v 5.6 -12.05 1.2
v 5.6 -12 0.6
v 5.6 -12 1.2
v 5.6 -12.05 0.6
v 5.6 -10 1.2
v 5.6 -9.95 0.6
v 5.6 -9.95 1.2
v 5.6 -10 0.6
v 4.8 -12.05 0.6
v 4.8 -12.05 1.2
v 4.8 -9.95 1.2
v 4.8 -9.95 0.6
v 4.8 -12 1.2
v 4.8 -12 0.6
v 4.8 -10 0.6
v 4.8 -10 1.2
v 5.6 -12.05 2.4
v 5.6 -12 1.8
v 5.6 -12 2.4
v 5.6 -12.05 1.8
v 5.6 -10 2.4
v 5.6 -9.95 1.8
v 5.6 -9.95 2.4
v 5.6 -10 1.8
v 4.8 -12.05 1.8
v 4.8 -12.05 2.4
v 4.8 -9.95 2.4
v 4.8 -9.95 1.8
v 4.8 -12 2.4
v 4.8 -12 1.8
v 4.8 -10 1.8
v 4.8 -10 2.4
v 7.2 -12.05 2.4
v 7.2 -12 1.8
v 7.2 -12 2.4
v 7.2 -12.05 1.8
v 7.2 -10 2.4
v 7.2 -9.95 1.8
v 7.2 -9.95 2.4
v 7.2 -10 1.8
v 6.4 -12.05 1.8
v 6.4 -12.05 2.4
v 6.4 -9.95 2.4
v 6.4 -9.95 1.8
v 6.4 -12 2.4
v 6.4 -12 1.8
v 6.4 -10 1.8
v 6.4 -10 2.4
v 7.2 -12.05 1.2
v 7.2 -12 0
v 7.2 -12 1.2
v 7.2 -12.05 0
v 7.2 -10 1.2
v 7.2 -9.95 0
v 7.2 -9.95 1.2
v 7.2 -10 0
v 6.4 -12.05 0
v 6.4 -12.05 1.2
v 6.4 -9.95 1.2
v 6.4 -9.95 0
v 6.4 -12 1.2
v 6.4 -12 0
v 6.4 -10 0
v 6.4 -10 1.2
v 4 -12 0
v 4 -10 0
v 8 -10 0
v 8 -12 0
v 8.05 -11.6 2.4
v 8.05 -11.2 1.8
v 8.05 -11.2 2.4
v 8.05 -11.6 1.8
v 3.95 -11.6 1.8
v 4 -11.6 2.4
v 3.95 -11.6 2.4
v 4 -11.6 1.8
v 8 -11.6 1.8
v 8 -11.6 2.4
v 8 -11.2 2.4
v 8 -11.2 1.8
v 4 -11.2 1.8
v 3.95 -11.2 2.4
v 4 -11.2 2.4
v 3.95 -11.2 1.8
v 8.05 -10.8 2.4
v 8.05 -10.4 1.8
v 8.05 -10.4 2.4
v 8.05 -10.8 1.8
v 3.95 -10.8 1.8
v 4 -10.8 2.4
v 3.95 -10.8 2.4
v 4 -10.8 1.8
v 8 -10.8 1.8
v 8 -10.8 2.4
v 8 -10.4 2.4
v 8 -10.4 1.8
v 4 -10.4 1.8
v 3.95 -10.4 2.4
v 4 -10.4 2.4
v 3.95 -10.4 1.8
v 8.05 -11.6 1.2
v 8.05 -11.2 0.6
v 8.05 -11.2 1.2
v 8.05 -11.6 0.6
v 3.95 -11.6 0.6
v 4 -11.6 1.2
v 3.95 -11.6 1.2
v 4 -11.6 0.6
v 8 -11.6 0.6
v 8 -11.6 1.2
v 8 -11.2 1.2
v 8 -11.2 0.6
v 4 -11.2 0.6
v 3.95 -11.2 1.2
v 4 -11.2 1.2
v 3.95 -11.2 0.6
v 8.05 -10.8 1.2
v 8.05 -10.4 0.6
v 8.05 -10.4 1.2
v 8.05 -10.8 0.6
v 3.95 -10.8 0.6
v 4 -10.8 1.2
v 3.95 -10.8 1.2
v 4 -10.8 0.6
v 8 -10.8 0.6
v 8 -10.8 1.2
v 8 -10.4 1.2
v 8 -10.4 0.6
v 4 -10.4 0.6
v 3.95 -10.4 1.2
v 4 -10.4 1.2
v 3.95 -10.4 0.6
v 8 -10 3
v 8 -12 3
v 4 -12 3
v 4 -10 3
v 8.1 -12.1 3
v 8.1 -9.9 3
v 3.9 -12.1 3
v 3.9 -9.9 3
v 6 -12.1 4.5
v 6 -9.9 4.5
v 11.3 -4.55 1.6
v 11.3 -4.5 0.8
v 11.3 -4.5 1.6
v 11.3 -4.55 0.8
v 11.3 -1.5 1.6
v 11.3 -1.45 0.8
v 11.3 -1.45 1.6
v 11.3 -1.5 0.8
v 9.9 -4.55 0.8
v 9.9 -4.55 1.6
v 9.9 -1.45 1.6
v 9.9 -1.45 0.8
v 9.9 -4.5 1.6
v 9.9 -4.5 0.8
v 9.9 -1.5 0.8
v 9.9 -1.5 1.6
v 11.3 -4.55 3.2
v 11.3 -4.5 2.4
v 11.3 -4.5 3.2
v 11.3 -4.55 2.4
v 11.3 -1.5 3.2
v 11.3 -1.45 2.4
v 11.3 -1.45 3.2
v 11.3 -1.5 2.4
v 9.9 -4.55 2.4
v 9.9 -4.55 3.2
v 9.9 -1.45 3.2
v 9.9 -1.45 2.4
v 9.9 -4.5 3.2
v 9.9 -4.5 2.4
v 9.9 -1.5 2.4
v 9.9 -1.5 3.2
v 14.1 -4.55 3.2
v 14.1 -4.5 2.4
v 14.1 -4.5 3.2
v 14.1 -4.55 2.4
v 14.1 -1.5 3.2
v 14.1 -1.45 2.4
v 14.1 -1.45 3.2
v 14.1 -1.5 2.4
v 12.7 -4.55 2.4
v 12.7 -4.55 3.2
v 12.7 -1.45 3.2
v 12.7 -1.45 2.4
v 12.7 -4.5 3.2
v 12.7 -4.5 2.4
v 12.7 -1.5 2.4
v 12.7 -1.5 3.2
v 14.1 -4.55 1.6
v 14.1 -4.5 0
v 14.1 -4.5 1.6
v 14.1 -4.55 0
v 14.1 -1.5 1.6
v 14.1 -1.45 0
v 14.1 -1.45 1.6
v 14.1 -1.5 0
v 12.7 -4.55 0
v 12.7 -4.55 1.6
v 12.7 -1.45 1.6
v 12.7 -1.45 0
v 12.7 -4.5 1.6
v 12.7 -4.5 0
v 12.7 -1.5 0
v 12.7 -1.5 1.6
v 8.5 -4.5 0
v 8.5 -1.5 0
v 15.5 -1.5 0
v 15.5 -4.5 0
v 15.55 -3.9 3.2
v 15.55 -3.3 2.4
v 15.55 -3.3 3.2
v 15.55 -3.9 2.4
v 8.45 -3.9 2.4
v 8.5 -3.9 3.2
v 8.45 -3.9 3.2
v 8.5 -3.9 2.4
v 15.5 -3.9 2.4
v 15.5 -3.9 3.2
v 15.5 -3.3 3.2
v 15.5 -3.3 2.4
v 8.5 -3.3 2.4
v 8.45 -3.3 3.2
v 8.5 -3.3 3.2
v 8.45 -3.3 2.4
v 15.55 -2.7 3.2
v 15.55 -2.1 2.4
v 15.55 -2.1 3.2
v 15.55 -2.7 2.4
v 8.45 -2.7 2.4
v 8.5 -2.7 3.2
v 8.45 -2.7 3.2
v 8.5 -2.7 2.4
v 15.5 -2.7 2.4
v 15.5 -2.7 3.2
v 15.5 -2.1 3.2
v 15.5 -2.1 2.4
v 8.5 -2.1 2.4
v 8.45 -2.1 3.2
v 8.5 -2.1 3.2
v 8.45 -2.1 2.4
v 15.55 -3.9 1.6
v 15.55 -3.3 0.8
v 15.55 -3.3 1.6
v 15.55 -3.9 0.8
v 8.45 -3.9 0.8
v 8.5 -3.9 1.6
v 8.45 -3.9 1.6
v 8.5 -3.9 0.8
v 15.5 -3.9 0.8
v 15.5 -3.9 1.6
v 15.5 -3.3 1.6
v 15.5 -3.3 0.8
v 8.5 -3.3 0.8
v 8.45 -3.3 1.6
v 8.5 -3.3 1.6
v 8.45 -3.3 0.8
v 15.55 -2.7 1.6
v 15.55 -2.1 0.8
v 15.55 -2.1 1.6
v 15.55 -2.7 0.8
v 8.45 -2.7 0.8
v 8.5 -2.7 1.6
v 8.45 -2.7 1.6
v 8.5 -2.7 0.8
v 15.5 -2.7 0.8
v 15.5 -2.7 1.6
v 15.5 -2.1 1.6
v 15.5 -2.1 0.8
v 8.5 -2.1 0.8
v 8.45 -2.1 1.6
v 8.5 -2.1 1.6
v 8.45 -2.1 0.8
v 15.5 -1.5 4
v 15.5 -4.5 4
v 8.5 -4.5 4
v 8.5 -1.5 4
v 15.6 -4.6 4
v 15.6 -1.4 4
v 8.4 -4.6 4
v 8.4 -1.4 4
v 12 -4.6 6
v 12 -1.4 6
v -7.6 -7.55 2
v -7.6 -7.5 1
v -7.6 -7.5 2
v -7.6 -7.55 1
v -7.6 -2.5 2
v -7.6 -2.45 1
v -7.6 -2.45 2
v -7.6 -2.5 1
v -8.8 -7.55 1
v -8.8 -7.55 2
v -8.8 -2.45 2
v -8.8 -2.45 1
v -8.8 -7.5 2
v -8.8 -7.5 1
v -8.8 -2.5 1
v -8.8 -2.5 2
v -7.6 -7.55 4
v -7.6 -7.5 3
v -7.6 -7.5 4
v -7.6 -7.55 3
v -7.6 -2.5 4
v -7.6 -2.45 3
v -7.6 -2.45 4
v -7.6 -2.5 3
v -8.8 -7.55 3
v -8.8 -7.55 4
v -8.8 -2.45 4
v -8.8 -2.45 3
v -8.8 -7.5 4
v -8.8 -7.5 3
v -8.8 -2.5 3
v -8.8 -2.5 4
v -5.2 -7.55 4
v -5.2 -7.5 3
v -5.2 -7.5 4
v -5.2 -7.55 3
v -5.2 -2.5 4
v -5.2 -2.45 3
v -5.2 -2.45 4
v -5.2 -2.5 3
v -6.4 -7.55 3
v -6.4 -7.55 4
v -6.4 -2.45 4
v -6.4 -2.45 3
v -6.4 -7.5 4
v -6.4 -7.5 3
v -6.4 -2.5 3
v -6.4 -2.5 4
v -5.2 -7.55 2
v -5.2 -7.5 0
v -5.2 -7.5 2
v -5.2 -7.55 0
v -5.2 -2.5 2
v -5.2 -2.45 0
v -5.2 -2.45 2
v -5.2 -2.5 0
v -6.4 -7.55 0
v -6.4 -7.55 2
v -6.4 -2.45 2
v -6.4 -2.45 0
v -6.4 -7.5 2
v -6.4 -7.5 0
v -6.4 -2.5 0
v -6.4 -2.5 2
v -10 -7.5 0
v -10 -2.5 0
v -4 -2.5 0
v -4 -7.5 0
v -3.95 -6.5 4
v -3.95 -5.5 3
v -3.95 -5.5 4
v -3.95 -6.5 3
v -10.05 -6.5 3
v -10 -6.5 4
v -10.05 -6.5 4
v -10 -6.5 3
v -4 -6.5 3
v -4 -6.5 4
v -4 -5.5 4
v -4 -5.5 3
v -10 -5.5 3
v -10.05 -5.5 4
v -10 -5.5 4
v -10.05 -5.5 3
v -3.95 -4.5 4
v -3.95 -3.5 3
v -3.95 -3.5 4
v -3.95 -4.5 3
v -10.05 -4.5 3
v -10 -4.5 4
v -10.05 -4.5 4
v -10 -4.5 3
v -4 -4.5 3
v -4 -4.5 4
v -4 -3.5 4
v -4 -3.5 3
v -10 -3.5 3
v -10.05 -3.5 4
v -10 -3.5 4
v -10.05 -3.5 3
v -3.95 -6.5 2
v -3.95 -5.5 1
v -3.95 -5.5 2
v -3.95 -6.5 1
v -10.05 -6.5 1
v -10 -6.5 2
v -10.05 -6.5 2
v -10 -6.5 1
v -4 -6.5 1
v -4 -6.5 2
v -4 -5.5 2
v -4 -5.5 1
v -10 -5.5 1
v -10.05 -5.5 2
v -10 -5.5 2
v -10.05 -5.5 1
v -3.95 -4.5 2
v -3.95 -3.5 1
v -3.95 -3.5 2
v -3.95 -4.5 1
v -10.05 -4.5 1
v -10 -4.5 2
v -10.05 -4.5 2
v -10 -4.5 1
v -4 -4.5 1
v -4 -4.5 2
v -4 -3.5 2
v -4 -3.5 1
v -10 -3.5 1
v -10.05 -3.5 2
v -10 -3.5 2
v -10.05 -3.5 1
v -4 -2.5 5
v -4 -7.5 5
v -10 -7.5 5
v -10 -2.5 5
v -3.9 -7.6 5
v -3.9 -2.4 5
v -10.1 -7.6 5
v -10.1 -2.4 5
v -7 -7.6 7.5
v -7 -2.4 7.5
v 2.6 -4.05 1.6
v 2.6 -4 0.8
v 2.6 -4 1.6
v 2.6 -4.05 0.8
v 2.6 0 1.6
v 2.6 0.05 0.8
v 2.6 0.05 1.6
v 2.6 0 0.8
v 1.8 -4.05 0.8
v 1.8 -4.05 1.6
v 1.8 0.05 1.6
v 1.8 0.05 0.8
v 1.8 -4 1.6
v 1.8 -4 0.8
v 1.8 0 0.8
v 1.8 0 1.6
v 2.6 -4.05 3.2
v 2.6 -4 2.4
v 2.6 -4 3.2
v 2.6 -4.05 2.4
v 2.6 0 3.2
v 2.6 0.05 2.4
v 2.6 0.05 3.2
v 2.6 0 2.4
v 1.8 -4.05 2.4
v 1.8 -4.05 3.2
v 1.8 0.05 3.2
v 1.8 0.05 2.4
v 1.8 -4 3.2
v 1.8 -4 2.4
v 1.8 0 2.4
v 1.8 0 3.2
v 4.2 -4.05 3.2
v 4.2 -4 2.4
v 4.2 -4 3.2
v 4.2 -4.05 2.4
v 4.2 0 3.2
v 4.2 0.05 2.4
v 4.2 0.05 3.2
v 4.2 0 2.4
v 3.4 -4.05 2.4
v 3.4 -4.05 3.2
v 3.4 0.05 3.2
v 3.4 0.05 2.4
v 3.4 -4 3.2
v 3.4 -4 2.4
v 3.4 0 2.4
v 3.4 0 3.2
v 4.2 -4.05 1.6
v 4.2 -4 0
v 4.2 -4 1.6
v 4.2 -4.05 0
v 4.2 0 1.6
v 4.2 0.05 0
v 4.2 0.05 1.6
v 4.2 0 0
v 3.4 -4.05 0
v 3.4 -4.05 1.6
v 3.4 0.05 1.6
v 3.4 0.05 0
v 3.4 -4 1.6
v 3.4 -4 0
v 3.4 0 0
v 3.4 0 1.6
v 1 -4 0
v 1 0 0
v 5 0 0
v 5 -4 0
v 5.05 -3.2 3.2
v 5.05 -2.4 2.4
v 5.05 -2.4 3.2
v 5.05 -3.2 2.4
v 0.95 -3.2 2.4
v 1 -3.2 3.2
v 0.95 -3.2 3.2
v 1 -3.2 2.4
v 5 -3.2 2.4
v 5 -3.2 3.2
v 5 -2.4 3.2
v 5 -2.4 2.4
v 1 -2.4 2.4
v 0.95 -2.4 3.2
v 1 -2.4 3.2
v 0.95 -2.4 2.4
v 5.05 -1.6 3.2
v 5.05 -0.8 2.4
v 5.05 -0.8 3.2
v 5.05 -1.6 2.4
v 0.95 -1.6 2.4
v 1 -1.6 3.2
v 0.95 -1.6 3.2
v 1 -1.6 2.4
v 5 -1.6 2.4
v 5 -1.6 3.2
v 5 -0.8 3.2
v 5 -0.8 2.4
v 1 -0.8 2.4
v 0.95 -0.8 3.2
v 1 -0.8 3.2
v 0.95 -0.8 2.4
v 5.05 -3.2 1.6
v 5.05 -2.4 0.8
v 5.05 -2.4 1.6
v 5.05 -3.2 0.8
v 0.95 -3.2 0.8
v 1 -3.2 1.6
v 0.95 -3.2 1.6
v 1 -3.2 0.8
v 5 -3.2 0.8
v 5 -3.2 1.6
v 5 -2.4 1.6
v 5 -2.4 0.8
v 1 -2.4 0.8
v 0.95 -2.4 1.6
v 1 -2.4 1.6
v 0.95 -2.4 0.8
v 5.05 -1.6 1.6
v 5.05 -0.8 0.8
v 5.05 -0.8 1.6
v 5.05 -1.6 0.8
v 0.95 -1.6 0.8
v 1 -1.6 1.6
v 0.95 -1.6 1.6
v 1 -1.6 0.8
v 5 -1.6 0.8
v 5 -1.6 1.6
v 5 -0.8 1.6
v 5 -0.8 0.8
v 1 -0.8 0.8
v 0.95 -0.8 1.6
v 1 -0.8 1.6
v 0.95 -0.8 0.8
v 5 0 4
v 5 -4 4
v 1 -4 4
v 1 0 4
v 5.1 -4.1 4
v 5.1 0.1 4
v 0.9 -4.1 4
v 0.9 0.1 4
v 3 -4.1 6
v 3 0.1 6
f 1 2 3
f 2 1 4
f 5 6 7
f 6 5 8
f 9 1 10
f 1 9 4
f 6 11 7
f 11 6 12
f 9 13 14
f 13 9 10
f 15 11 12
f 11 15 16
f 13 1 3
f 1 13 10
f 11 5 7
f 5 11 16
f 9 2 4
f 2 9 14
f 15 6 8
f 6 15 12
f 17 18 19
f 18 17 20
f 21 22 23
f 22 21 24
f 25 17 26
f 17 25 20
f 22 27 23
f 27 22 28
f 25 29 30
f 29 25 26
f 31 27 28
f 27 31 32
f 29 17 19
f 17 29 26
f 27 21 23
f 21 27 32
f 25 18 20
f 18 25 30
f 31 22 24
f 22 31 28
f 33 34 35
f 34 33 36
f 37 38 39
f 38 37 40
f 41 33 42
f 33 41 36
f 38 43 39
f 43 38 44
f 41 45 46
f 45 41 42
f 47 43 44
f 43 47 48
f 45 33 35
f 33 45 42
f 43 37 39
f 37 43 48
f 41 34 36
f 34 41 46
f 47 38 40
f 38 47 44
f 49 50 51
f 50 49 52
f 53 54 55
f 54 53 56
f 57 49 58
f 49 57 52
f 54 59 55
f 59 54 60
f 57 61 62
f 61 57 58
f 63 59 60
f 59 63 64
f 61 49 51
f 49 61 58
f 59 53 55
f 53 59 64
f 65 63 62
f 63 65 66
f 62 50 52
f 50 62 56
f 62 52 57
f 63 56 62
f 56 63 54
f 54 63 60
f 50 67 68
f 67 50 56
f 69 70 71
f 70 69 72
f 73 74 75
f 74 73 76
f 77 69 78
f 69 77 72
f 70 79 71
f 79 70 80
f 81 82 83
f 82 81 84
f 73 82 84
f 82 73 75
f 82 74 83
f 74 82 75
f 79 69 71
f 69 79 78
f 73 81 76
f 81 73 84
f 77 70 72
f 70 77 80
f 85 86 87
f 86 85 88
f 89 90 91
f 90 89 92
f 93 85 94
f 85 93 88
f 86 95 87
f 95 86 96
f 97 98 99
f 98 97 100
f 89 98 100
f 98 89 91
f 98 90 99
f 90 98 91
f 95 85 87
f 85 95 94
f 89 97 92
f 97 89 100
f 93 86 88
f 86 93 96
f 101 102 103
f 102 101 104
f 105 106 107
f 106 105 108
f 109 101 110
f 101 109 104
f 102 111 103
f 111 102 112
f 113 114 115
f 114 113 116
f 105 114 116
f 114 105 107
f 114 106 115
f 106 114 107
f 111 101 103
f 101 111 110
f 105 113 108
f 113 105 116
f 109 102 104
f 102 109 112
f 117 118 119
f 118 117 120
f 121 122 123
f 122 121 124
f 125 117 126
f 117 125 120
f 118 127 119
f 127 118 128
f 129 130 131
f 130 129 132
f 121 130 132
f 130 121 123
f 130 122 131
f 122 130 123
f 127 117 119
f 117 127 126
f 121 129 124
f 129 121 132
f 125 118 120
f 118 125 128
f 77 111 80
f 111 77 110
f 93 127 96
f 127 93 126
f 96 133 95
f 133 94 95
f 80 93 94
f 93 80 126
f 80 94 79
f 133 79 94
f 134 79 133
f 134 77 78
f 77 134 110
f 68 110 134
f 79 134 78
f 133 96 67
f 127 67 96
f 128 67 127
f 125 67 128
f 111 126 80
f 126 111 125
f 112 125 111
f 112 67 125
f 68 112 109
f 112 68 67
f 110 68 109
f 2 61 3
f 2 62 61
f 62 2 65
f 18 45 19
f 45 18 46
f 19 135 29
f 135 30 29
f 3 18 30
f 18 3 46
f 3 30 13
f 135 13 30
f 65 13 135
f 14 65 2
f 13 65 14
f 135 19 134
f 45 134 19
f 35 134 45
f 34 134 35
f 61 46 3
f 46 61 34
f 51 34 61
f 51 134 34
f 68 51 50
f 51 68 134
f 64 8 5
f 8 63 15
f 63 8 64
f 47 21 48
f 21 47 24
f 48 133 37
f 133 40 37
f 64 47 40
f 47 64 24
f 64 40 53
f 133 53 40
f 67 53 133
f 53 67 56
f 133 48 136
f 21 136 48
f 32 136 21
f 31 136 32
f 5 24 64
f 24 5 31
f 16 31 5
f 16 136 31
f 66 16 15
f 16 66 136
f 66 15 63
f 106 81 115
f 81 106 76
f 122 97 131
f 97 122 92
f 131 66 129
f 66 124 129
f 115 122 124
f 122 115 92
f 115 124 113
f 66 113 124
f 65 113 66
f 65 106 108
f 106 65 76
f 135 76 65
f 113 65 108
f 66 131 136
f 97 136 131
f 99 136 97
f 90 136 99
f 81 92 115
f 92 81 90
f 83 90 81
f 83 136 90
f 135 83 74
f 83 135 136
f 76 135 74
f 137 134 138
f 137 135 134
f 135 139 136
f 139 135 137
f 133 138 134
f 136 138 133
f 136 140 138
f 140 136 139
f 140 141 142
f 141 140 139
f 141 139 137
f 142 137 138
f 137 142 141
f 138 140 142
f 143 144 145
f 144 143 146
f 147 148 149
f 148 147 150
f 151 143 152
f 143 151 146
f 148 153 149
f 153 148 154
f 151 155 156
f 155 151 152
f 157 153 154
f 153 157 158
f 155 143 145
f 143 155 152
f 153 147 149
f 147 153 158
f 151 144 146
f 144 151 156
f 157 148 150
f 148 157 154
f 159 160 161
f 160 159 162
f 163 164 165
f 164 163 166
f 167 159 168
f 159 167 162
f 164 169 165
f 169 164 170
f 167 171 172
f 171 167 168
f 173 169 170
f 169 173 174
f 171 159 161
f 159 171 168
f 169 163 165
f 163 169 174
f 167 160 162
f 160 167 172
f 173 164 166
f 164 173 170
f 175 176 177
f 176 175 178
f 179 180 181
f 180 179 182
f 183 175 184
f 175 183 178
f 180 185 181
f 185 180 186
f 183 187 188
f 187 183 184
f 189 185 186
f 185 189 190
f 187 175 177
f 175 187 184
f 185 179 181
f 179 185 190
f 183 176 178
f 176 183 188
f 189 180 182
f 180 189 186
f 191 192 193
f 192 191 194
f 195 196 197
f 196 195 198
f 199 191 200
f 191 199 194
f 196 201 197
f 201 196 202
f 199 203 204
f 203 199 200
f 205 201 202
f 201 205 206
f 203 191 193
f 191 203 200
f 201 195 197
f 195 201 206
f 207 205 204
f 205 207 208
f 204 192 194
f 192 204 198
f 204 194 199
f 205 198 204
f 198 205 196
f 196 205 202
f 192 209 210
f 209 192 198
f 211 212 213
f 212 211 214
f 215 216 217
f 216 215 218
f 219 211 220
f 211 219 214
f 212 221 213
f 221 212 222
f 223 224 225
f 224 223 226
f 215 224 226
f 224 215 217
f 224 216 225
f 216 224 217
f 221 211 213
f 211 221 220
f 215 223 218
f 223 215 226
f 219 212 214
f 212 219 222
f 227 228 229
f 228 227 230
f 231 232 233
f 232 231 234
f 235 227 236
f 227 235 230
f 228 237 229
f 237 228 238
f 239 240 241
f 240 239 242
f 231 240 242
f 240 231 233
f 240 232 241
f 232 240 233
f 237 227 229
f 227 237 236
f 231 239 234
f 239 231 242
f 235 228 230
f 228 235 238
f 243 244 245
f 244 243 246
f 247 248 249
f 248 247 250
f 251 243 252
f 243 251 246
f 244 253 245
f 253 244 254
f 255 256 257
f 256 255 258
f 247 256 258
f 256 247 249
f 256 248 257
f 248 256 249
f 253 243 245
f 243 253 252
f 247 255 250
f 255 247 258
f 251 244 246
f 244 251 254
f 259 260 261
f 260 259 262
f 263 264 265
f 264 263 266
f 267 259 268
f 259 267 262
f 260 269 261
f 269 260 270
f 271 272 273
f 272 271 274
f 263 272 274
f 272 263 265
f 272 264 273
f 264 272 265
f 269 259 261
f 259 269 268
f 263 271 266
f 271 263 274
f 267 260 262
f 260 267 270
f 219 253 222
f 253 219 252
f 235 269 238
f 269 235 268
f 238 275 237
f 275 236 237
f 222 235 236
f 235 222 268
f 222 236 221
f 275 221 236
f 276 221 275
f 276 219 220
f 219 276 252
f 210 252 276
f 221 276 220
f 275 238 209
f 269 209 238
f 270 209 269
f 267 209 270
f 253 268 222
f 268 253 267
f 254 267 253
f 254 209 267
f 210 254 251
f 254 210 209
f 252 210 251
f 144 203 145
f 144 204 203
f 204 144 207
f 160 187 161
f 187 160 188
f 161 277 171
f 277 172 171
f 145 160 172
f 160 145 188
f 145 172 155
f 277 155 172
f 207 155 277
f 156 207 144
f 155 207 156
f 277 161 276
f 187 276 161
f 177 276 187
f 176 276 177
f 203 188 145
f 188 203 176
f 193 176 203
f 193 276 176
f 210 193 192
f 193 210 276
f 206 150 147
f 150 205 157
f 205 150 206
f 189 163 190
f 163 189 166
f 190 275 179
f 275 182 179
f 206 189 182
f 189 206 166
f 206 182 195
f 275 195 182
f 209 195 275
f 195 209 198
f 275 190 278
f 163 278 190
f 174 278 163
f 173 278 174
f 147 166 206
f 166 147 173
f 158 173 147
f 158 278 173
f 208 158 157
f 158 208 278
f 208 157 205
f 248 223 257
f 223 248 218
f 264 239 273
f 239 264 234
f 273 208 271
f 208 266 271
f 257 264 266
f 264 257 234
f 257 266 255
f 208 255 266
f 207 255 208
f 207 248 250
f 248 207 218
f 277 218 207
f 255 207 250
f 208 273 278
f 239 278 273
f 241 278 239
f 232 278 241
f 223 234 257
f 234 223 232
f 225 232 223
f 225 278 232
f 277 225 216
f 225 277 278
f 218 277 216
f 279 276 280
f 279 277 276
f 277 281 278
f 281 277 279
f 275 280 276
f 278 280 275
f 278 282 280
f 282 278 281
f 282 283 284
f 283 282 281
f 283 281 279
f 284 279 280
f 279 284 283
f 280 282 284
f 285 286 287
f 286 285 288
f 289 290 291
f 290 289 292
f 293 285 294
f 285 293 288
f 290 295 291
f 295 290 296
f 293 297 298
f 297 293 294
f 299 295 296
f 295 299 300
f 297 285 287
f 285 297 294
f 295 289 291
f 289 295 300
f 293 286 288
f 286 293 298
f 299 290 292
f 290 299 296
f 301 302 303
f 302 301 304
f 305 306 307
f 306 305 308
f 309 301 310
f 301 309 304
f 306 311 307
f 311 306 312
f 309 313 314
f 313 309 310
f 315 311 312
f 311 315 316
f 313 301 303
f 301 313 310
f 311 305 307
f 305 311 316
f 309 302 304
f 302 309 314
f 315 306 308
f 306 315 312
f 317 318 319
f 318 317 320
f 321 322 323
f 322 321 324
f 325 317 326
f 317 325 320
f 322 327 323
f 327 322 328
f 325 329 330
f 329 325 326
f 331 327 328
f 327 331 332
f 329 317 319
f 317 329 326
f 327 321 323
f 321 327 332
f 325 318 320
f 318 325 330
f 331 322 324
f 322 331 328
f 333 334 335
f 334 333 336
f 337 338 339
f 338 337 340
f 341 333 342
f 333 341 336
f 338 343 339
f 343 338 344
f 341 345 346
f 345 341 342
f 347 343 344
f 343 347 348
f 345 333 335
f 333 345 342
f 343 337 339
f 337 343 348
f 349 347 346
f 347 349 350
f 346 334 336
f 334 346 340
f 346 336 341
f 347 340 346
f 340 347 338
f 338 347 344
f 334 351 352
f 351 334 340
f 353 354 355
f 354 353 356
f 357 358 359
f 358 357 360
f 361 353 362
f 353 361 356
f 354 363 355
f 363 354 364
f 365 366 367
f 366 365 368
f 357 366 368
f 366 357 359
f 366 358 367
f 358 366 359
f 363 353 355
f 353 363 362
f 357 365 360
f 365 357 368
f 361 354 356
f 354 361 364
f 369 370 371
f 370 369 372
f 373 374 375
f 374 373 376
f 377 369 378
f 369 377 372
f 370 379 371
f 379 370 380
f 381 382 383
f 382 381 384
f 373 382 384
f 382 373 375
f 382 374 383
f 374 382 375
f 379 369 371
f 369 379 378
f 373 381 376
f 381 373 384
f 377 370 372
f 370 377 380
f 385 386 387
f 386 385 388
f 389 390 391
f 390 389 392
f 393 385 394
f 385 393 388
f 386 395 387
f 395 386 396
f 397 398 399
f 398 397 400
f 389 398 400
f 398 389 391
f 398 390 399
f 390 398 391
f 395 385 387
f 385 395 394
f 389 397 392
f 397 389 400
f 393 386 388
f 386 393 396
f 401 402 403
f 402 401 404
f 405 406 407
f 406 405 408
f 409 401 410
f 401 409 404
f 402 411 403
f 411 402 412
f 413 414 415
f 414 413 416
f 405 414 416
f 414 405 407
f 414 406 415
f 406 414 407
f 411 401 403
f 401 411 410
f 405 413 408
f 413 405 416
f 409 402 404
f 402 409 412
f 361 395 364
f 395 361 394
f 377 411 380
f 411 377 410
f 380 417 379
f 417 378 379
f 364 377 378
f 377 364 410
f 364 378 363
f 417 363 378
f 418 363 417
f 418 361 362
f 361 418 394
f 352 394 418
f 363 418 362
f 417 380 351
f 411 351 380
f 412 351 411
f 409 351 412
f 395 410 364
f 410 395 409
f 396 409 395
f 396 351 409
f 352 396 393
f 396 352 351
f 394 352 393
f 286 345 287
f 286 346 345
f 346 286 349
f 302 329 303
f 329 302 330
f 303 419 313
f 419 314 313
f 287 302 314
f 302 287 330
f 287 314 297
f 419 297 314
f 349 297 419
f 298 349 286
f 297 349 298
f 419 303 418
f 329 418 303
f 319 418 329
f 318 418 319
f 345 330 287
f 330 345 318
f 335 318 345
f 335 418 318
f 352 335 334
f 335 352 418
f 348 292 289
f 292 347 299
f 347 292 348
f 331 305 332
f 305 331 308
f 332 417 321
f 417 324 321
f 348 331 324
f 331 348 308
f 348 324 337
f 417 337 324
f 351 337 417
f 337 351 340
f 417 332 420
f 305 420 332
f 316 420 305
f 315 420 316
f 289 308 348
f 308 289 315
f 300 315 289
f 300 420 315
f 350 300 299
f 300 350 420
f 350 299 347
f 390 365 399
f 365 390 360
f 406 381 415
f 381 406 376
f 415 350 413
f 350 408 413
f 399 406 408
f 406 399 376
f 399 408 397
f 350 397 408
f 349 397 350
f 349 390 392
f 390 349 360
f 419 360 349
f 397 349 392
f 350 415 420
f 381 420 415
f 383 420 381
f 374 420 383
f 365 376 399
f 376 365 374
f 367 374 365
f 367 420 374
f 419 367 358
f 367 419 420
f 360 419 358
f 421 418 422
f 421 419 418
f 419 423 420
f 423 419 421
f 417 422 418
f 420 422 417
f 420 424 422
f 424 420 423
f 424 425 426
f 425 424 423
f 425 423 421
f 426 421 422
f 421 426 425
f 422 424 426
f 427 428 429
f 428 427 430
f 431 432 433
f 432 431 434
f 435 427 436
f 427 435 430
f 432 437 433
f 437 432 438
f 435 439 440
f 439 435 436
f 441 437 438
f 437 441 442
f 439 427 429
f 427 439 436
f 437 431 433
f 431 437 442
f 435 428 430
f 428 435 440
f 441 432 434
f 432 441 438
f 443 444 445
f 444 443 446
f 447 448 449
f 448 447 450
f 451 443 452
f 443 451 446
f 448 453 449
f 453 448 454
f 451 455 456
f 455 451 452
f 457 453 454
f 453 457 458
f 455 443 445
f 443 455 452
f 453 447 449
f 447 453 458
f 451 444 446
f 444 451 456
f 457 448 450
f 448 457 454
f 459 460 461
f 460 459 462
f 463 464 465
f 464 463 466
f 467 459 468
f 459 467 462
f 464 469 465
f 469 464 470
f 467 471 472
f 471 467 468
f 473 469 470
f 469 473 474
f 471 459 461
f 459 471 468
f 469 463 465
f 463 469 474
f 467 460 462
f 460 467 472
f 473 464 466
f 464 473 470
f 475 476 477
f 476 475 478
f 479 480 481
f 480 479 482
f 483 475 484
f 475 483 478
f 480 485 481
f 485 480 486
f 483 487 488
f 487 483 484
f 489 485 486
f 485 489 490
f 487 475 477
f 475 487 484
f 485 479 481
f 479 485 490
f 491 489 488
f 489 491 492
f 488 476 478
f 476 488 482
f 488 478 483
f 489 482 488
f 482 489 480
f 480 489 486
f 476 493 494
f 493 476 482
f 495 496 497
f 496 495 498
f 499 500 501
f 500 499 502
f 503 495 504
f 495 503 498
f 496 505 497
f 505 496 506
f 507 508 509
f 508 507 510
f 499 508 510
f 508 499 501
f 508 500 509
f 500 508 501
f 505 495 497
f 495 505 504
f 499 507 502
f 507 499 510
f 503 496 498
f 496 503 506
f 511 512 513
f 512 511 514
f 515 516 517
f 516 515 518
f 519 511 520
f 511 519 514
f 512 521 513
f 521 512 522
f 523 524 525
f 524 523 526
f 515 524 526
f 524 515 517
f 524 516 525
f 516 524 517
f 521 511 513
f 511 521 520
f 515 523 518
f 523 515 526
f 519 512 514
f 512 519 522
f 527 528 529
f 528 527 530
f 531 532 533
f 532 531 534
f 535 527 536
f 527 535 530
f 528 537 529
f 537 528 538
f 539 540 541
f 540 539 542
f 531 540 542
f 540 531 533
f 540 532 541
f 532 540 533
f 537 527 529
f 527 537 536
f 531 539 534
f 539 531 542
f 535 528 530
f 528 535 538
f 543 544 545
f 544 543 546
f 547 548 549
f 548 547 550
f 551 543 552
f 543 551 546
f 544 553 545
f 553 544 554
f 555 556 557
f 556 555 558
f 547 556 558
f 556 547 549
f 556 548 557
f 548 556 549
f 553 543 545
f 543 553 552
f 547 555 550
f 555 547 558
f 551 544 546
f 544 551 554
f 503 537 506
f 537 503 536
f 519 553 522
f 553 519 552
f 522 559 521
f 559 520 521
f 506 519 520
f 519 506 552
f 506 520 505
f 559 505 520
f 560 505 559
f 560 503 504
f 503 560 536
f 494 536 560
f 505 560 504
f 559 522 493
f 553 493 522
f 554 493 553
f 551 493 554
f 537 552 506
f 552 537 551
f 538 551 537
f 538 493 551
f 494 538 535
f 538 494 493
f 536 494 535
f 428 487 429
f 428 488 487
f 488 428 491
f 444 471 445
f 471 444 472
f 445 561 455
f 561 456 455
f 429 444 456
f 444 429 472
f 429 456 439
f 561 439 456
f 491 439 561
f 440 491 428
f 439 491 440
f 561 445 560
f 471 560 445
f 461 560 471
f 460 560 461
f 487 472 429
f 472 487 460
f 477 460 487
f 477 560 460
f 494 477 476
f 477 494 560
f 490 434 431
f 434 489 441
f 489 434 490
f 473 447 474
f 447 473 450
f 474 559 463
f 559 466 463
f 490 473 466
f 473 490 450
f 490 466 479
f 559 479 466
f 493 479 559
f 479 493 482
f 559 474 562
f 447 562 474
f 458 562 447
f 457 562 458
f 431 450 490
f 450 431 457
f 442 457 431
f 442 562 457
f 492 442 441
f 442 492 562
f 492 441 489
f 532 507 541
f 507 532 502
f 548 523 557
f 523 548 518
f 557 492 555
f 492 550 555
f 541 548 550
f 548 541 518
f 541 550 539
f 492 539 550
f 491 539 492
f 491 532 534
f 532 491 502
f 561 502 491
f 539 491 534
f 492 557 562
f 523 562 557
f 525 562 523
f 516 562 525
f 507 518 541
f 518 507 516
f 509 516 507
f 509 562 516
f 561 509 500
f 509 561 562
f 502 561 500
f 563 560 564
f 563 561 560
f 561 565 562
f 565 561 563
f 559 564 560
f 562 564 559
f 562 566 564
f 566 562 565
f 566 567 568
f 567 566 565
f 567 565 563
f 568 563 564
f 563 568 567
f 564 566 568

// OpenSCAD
house(4,3,2,6,11,1);
house(7,4,3,12,3,1);
house(6,5,5,-7,5,1);
house(4,4,4,3,2,1);



//Haus mit den Maßen (lx,ly,lz) 
//lx=[4-9], ly=[4-7], lz=[3-9] aus Gründen der Ästhetik ^.^
//ly = Höhe
//Position px,pz
//s_window: wenn 1 dann haben die Seiten auch Fenster, wenn 0, dann sind nur vorne und hinten Fenster

module house(lx,ly,lz,px,pz,s_window)
{
    rotate (a=[90,0,0]) {
        //Haus
        translate([px,(ly/2),pz]){
            color([139/255,119/255,101/255]){
        cube([lx,ly,lz],center = true);
            }
        }
       
        
        //Dach 
        //stehen auf jeder Seite um 0.1 über
        translate([px,(ly+ly/6),pz])
        rotate([0,0,90])
        color([51/255,51/255,51/255])
        resize([ly/2,(lx+0.2),(lz+0.2)])    
        cylinder(h=(ly/3), r1=2, r2=2,center=true, $fn=3);
        
        
        
        //Fenster v/h und Tür 
        translate([px,(ly/2),pz]){   
            
        color([238/255,221/255,130/255]){
            
        translate([(-lx/5),(-ly/5),0])
        cube([(lx/5), (ly/5), (lz+0.1)], center = true);
        
        translate([(-lx/5),(+ly/5),0])
        cube([(lx/5), (ly/5), (lz+0.1)], center = true);
        
        translate([(+lx/5),(+ly/5),0])
        cube([(lx/5), (ly/5), (lz+0.1)],center = true);
        
        //Tür
        translate([(+lx/5),(-ly/5-ly/10),0])
        cube([(lx/5), (ly*2/5), (lz+0.1)],center = true);
              
        }//Color-Ende
        
        }//translate-Ende
        
         
        
        //Fenster Seitenwände
        if (s_window == 1) {
            
        translate([px,(ly/2),pz]){
            
            
        color([238/255,221/255,130/255]){
            
        translate([0,(ly/5),(lz/5)])
        cube([(lx+0.1), (ly/5), (lz/5)], center = true);
        
        translate([0,(ly/5),(-lz/5)])
        cube([(lx+0.1), (ly/5), (lz/5)], center = true);
        
        translate([0,(-ly/5),(lz/5)])
        cube([(lx+0.1), (ly/5), (lz/5)],center = true);
        
        translate([0,(-ly/5),(-lz/5)])
        cube([(lx+0.1), (ly/5), (lz/5)],center = true);
             
            
        }//color-Ende
        
        }//translate-Ende
        
        } // if (s_window == 1) Ende
    }
}//house-Ende
